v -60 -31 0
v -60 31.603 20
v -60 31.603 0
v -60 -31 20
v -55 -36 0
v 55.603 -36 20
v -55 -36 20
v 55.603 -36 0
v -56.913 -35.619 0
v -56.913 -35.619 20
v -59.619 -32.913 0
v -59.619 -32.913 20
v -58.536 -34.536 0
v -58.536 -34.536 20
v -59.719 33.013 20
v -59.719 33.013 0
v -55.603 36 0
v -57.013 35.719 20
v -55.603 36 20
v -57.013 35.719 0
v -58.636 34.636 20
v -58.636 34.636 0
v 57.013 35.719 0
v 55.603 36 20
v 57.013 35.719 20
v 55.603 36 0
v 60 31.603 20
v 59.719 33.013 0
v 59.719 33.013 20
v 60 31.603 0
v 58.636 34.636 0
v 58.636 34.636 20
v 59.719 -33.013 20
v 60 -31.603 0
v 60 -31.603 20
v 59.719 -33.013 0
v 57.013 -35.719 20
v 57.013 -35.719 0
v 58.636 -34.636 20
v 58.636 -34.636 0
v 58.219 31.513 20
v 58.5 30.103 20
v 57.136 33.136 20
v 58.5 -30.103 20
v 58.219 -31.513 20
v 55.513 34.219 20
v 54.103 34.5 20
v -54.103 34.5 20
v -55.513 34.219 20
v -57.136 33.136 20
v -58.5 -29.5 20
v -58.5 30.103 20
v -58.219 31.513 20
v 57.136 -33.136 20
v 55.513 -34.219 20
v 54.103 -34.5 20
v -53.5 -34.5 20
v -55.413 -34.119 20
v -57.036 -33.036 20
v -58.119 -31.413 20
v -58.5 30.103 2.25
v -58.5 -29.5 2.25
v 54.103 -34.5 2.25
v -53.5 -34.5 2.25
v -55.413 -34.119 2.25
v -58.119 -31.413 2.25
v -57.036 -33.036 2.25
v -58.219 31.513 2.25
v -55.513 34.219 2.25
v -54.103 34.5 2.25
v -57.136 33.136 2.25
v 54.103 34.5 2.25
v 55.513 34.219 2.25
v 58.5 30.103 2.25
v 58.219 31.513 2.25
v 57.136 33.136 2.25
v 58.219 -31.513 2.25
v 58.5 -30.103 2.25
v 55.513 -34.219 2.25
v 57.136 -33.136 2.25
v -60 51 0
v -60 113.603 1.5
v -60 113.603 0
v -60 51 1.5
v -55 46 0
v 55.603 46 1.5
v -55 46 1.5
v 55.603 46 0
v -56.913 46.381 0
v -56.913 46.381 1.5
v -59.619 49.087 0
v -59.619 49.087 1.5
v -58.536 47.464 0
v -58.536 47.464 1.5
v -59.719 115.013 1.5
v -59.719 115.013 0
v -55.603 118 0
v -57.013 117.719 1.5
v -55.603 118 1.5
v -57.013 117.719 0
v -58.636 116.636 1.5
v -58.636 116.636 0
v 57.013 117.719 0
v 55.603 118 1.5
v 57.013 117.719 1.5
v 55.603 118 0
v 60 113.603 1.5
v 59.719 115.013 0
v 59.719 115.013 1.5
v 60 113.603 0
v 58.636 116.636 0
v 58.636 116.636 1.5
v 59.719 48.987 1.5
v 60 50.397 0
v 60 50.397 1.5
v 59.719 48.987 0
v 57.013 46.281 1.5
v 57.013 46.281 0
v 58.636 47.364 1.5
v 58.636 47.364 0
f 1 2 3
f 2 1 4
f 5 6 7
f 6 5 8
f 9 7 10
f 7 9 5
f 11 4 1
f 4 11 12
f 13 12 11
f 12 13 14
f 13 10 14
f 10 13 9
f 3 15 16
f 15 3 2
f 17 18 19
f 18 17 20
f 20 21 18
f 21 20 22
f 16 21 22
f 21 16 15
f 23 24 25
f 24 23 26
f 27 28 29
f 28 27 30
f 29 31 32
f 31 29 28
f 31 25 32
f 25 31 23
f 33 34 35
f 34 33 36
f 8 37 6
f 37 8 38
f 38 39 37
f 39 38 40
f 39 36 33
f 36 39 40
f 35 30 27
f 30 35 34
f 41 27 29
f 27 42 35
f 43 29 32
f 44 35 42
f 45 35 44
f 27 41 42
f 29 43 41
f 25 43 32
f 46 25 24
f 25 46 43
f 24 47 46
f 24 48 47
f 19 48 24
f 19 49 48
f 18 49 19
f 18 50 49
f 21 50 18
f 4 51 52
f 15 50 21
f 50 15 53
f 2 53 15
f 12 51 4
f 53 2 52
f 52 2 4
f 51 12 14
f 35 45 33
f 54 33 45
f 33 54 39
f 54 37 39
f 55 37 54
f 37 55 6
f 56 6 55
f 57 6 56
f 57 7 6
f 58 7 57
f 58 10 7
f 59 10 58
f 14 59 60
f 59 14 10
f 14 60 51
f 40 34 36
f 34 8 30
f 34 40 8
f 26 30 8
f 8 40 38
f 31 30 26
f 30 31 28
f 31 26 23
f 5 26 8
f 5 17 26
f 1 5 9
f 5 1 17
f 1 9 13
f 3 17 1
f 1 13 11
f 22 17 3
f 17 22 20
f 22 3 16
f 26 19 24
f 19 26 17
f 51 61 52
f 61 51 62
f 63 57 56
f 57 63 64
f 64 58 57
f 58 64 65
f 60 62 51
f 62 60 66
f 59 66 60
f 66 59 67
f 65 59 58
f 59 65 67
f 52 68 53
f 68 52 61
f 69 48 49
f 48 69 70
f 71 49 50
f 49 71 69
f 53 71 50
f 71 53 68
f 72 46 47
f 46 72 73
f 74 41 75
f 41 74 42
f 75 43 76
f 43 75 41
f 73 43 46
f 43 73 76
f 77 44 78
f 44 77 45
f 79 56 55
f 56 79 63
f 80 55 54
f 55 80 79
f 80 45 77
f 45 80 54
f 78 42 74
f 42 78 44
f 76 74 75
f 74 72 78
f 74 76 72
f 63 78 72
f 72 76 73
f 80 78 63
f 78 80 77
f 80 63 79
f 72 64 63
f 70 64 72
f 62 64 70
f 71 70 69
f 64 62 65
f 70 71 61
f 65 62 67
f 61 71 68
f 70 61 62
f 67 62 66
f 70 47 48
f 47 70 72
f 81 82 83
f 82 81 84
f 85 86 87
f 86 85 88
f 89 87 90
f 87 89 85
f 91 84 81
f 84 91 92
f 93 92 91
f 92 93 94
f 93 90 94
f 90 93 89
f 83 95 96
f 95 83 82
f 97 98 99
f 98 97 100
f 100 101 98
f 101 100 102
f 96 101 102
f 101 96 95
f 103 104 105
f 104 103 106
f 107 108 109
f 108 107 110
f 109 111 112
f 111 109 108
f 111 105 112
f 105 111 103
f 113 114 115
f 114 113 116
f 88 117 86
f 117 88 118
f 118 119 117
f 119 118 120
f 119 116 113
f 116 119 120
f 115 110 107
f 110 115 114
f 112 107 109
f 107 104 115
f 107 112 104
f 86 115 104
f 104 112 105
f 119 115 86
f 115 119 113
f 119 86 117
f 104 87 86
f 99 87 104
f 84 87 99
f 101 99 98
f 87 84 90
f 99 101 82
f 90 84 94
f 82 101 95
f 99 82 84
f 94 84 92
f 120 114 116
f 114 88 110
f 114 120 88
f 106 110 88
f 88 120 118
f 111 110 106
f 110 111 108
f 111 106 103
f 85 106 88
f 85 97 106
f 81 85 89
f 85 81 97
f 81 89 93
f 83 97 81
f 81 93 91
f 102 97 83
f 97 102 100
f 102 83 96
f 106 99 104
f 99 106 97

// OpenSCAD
//
// Customized Enclosure
//

/*[Dimensions]*/

// Width of the enclosure
width = 120.0;
// Height of the enclosure
height = 72.0;
// Depth of the enclosure
depth = 20.0;
// Thickness of the walls and lid
thickness = 1.5;
// Amount of corner rounding
fillet_radius = 5.0;

// 
// builds a solid rectangle with rounded corners (Z-only)
//
module block(width, height, depth, fillet_radius) {
    
    difference() {
        cube([width, height, depth], center = true);
        
        fudge = 0.1;
        fudge_depth = depth + 1.0;
        
        translate([-(width / 2), -(height / 2), -(fudge_depth / 2)])
        intersection () {
            cube([fillet_radius, fillet_radius, fudge_depth], center = false); 
            difference() {
                    cube([2 * fillet_radius, 2 * fillet_radius, fudge_depth], center = false); 
                    translate([fillet_radius, fillet_radius, 0.0])
                    cylinder(r = fillet_radius, h = fudge_depth);
            }
        }

        translate([-(width / 2 + fudge), (height / 2 + fudge), -(fudge_depth / 2)])
        rotate([0.0, 0.0, -90])
        intersection () {
            cube([fillet_radius, fillet_radius, fudge_depth], center = false); 
            difference() {
                    cube([2 * fillet_radius, 2 * fillet_radius, fudge_depth], center = false); 
                    translate([fillet_radius, fillet_radius, 0.0])
                    cylinder(r = fillet_radius, h = fudge_depth);
            }
        }

        translate([(width / 2 + fudge), (height / 2 + fudge), -(fudge_depth / 2)])
        rotate([0.0, 0.0, 180])
        intersection () {
            cube([fillet_radius, fillet_radius, fudge_depth], center = false); 
            difference() {
                    cube([2 * fillet_radius, 2 * fillet_radius, fudge_depth], center = false); 
                    translate([fillet_radius, fillet_radius, 0.0])
                    cylinder(r = fillet_radius, h = fudge_depth);
            }
        }

        translate([(width / 2 + fudge), -(height / 2 + fudge), -(fudge_depth / 2)])
        rotate([0.0, 0.0, 90])
        intersection () {
            cube([fillet_radius, fillet_radius, fudge_depth], center = false); 
            difference() {
                    cube([2 * fillet_radius, 2 * fillet_radius, fudge_depth], center = false); 
                    translate([fillet_radius, fillet_radius, 0.0])
                    cylinder(r = fillet_radius, h = fudge_depth);
            }
        }
    }
}

module enclosure(width, height, depth, fillet_radius, thickness) {
    translate([0.0, 0.0, depth / 2.0])
    difference() {
        block(width, height, depth, fillet_radius);
        translate([0.0, 0.0, thickness]) 
            block(width - (2 * thickness), height - (2 * thickness), depth - thickness, fillet_radius);
    }
}

module lid(width, height, fillet_radius, thickness) {
    translate([0.0, height + 10, thickness / 2.0])
        block(width, height, thickness, fillet_radius);
}

enclosure(width, height, depth, fillet_radius, thickness);
lid(width, height, fillet_radius, thickness);
